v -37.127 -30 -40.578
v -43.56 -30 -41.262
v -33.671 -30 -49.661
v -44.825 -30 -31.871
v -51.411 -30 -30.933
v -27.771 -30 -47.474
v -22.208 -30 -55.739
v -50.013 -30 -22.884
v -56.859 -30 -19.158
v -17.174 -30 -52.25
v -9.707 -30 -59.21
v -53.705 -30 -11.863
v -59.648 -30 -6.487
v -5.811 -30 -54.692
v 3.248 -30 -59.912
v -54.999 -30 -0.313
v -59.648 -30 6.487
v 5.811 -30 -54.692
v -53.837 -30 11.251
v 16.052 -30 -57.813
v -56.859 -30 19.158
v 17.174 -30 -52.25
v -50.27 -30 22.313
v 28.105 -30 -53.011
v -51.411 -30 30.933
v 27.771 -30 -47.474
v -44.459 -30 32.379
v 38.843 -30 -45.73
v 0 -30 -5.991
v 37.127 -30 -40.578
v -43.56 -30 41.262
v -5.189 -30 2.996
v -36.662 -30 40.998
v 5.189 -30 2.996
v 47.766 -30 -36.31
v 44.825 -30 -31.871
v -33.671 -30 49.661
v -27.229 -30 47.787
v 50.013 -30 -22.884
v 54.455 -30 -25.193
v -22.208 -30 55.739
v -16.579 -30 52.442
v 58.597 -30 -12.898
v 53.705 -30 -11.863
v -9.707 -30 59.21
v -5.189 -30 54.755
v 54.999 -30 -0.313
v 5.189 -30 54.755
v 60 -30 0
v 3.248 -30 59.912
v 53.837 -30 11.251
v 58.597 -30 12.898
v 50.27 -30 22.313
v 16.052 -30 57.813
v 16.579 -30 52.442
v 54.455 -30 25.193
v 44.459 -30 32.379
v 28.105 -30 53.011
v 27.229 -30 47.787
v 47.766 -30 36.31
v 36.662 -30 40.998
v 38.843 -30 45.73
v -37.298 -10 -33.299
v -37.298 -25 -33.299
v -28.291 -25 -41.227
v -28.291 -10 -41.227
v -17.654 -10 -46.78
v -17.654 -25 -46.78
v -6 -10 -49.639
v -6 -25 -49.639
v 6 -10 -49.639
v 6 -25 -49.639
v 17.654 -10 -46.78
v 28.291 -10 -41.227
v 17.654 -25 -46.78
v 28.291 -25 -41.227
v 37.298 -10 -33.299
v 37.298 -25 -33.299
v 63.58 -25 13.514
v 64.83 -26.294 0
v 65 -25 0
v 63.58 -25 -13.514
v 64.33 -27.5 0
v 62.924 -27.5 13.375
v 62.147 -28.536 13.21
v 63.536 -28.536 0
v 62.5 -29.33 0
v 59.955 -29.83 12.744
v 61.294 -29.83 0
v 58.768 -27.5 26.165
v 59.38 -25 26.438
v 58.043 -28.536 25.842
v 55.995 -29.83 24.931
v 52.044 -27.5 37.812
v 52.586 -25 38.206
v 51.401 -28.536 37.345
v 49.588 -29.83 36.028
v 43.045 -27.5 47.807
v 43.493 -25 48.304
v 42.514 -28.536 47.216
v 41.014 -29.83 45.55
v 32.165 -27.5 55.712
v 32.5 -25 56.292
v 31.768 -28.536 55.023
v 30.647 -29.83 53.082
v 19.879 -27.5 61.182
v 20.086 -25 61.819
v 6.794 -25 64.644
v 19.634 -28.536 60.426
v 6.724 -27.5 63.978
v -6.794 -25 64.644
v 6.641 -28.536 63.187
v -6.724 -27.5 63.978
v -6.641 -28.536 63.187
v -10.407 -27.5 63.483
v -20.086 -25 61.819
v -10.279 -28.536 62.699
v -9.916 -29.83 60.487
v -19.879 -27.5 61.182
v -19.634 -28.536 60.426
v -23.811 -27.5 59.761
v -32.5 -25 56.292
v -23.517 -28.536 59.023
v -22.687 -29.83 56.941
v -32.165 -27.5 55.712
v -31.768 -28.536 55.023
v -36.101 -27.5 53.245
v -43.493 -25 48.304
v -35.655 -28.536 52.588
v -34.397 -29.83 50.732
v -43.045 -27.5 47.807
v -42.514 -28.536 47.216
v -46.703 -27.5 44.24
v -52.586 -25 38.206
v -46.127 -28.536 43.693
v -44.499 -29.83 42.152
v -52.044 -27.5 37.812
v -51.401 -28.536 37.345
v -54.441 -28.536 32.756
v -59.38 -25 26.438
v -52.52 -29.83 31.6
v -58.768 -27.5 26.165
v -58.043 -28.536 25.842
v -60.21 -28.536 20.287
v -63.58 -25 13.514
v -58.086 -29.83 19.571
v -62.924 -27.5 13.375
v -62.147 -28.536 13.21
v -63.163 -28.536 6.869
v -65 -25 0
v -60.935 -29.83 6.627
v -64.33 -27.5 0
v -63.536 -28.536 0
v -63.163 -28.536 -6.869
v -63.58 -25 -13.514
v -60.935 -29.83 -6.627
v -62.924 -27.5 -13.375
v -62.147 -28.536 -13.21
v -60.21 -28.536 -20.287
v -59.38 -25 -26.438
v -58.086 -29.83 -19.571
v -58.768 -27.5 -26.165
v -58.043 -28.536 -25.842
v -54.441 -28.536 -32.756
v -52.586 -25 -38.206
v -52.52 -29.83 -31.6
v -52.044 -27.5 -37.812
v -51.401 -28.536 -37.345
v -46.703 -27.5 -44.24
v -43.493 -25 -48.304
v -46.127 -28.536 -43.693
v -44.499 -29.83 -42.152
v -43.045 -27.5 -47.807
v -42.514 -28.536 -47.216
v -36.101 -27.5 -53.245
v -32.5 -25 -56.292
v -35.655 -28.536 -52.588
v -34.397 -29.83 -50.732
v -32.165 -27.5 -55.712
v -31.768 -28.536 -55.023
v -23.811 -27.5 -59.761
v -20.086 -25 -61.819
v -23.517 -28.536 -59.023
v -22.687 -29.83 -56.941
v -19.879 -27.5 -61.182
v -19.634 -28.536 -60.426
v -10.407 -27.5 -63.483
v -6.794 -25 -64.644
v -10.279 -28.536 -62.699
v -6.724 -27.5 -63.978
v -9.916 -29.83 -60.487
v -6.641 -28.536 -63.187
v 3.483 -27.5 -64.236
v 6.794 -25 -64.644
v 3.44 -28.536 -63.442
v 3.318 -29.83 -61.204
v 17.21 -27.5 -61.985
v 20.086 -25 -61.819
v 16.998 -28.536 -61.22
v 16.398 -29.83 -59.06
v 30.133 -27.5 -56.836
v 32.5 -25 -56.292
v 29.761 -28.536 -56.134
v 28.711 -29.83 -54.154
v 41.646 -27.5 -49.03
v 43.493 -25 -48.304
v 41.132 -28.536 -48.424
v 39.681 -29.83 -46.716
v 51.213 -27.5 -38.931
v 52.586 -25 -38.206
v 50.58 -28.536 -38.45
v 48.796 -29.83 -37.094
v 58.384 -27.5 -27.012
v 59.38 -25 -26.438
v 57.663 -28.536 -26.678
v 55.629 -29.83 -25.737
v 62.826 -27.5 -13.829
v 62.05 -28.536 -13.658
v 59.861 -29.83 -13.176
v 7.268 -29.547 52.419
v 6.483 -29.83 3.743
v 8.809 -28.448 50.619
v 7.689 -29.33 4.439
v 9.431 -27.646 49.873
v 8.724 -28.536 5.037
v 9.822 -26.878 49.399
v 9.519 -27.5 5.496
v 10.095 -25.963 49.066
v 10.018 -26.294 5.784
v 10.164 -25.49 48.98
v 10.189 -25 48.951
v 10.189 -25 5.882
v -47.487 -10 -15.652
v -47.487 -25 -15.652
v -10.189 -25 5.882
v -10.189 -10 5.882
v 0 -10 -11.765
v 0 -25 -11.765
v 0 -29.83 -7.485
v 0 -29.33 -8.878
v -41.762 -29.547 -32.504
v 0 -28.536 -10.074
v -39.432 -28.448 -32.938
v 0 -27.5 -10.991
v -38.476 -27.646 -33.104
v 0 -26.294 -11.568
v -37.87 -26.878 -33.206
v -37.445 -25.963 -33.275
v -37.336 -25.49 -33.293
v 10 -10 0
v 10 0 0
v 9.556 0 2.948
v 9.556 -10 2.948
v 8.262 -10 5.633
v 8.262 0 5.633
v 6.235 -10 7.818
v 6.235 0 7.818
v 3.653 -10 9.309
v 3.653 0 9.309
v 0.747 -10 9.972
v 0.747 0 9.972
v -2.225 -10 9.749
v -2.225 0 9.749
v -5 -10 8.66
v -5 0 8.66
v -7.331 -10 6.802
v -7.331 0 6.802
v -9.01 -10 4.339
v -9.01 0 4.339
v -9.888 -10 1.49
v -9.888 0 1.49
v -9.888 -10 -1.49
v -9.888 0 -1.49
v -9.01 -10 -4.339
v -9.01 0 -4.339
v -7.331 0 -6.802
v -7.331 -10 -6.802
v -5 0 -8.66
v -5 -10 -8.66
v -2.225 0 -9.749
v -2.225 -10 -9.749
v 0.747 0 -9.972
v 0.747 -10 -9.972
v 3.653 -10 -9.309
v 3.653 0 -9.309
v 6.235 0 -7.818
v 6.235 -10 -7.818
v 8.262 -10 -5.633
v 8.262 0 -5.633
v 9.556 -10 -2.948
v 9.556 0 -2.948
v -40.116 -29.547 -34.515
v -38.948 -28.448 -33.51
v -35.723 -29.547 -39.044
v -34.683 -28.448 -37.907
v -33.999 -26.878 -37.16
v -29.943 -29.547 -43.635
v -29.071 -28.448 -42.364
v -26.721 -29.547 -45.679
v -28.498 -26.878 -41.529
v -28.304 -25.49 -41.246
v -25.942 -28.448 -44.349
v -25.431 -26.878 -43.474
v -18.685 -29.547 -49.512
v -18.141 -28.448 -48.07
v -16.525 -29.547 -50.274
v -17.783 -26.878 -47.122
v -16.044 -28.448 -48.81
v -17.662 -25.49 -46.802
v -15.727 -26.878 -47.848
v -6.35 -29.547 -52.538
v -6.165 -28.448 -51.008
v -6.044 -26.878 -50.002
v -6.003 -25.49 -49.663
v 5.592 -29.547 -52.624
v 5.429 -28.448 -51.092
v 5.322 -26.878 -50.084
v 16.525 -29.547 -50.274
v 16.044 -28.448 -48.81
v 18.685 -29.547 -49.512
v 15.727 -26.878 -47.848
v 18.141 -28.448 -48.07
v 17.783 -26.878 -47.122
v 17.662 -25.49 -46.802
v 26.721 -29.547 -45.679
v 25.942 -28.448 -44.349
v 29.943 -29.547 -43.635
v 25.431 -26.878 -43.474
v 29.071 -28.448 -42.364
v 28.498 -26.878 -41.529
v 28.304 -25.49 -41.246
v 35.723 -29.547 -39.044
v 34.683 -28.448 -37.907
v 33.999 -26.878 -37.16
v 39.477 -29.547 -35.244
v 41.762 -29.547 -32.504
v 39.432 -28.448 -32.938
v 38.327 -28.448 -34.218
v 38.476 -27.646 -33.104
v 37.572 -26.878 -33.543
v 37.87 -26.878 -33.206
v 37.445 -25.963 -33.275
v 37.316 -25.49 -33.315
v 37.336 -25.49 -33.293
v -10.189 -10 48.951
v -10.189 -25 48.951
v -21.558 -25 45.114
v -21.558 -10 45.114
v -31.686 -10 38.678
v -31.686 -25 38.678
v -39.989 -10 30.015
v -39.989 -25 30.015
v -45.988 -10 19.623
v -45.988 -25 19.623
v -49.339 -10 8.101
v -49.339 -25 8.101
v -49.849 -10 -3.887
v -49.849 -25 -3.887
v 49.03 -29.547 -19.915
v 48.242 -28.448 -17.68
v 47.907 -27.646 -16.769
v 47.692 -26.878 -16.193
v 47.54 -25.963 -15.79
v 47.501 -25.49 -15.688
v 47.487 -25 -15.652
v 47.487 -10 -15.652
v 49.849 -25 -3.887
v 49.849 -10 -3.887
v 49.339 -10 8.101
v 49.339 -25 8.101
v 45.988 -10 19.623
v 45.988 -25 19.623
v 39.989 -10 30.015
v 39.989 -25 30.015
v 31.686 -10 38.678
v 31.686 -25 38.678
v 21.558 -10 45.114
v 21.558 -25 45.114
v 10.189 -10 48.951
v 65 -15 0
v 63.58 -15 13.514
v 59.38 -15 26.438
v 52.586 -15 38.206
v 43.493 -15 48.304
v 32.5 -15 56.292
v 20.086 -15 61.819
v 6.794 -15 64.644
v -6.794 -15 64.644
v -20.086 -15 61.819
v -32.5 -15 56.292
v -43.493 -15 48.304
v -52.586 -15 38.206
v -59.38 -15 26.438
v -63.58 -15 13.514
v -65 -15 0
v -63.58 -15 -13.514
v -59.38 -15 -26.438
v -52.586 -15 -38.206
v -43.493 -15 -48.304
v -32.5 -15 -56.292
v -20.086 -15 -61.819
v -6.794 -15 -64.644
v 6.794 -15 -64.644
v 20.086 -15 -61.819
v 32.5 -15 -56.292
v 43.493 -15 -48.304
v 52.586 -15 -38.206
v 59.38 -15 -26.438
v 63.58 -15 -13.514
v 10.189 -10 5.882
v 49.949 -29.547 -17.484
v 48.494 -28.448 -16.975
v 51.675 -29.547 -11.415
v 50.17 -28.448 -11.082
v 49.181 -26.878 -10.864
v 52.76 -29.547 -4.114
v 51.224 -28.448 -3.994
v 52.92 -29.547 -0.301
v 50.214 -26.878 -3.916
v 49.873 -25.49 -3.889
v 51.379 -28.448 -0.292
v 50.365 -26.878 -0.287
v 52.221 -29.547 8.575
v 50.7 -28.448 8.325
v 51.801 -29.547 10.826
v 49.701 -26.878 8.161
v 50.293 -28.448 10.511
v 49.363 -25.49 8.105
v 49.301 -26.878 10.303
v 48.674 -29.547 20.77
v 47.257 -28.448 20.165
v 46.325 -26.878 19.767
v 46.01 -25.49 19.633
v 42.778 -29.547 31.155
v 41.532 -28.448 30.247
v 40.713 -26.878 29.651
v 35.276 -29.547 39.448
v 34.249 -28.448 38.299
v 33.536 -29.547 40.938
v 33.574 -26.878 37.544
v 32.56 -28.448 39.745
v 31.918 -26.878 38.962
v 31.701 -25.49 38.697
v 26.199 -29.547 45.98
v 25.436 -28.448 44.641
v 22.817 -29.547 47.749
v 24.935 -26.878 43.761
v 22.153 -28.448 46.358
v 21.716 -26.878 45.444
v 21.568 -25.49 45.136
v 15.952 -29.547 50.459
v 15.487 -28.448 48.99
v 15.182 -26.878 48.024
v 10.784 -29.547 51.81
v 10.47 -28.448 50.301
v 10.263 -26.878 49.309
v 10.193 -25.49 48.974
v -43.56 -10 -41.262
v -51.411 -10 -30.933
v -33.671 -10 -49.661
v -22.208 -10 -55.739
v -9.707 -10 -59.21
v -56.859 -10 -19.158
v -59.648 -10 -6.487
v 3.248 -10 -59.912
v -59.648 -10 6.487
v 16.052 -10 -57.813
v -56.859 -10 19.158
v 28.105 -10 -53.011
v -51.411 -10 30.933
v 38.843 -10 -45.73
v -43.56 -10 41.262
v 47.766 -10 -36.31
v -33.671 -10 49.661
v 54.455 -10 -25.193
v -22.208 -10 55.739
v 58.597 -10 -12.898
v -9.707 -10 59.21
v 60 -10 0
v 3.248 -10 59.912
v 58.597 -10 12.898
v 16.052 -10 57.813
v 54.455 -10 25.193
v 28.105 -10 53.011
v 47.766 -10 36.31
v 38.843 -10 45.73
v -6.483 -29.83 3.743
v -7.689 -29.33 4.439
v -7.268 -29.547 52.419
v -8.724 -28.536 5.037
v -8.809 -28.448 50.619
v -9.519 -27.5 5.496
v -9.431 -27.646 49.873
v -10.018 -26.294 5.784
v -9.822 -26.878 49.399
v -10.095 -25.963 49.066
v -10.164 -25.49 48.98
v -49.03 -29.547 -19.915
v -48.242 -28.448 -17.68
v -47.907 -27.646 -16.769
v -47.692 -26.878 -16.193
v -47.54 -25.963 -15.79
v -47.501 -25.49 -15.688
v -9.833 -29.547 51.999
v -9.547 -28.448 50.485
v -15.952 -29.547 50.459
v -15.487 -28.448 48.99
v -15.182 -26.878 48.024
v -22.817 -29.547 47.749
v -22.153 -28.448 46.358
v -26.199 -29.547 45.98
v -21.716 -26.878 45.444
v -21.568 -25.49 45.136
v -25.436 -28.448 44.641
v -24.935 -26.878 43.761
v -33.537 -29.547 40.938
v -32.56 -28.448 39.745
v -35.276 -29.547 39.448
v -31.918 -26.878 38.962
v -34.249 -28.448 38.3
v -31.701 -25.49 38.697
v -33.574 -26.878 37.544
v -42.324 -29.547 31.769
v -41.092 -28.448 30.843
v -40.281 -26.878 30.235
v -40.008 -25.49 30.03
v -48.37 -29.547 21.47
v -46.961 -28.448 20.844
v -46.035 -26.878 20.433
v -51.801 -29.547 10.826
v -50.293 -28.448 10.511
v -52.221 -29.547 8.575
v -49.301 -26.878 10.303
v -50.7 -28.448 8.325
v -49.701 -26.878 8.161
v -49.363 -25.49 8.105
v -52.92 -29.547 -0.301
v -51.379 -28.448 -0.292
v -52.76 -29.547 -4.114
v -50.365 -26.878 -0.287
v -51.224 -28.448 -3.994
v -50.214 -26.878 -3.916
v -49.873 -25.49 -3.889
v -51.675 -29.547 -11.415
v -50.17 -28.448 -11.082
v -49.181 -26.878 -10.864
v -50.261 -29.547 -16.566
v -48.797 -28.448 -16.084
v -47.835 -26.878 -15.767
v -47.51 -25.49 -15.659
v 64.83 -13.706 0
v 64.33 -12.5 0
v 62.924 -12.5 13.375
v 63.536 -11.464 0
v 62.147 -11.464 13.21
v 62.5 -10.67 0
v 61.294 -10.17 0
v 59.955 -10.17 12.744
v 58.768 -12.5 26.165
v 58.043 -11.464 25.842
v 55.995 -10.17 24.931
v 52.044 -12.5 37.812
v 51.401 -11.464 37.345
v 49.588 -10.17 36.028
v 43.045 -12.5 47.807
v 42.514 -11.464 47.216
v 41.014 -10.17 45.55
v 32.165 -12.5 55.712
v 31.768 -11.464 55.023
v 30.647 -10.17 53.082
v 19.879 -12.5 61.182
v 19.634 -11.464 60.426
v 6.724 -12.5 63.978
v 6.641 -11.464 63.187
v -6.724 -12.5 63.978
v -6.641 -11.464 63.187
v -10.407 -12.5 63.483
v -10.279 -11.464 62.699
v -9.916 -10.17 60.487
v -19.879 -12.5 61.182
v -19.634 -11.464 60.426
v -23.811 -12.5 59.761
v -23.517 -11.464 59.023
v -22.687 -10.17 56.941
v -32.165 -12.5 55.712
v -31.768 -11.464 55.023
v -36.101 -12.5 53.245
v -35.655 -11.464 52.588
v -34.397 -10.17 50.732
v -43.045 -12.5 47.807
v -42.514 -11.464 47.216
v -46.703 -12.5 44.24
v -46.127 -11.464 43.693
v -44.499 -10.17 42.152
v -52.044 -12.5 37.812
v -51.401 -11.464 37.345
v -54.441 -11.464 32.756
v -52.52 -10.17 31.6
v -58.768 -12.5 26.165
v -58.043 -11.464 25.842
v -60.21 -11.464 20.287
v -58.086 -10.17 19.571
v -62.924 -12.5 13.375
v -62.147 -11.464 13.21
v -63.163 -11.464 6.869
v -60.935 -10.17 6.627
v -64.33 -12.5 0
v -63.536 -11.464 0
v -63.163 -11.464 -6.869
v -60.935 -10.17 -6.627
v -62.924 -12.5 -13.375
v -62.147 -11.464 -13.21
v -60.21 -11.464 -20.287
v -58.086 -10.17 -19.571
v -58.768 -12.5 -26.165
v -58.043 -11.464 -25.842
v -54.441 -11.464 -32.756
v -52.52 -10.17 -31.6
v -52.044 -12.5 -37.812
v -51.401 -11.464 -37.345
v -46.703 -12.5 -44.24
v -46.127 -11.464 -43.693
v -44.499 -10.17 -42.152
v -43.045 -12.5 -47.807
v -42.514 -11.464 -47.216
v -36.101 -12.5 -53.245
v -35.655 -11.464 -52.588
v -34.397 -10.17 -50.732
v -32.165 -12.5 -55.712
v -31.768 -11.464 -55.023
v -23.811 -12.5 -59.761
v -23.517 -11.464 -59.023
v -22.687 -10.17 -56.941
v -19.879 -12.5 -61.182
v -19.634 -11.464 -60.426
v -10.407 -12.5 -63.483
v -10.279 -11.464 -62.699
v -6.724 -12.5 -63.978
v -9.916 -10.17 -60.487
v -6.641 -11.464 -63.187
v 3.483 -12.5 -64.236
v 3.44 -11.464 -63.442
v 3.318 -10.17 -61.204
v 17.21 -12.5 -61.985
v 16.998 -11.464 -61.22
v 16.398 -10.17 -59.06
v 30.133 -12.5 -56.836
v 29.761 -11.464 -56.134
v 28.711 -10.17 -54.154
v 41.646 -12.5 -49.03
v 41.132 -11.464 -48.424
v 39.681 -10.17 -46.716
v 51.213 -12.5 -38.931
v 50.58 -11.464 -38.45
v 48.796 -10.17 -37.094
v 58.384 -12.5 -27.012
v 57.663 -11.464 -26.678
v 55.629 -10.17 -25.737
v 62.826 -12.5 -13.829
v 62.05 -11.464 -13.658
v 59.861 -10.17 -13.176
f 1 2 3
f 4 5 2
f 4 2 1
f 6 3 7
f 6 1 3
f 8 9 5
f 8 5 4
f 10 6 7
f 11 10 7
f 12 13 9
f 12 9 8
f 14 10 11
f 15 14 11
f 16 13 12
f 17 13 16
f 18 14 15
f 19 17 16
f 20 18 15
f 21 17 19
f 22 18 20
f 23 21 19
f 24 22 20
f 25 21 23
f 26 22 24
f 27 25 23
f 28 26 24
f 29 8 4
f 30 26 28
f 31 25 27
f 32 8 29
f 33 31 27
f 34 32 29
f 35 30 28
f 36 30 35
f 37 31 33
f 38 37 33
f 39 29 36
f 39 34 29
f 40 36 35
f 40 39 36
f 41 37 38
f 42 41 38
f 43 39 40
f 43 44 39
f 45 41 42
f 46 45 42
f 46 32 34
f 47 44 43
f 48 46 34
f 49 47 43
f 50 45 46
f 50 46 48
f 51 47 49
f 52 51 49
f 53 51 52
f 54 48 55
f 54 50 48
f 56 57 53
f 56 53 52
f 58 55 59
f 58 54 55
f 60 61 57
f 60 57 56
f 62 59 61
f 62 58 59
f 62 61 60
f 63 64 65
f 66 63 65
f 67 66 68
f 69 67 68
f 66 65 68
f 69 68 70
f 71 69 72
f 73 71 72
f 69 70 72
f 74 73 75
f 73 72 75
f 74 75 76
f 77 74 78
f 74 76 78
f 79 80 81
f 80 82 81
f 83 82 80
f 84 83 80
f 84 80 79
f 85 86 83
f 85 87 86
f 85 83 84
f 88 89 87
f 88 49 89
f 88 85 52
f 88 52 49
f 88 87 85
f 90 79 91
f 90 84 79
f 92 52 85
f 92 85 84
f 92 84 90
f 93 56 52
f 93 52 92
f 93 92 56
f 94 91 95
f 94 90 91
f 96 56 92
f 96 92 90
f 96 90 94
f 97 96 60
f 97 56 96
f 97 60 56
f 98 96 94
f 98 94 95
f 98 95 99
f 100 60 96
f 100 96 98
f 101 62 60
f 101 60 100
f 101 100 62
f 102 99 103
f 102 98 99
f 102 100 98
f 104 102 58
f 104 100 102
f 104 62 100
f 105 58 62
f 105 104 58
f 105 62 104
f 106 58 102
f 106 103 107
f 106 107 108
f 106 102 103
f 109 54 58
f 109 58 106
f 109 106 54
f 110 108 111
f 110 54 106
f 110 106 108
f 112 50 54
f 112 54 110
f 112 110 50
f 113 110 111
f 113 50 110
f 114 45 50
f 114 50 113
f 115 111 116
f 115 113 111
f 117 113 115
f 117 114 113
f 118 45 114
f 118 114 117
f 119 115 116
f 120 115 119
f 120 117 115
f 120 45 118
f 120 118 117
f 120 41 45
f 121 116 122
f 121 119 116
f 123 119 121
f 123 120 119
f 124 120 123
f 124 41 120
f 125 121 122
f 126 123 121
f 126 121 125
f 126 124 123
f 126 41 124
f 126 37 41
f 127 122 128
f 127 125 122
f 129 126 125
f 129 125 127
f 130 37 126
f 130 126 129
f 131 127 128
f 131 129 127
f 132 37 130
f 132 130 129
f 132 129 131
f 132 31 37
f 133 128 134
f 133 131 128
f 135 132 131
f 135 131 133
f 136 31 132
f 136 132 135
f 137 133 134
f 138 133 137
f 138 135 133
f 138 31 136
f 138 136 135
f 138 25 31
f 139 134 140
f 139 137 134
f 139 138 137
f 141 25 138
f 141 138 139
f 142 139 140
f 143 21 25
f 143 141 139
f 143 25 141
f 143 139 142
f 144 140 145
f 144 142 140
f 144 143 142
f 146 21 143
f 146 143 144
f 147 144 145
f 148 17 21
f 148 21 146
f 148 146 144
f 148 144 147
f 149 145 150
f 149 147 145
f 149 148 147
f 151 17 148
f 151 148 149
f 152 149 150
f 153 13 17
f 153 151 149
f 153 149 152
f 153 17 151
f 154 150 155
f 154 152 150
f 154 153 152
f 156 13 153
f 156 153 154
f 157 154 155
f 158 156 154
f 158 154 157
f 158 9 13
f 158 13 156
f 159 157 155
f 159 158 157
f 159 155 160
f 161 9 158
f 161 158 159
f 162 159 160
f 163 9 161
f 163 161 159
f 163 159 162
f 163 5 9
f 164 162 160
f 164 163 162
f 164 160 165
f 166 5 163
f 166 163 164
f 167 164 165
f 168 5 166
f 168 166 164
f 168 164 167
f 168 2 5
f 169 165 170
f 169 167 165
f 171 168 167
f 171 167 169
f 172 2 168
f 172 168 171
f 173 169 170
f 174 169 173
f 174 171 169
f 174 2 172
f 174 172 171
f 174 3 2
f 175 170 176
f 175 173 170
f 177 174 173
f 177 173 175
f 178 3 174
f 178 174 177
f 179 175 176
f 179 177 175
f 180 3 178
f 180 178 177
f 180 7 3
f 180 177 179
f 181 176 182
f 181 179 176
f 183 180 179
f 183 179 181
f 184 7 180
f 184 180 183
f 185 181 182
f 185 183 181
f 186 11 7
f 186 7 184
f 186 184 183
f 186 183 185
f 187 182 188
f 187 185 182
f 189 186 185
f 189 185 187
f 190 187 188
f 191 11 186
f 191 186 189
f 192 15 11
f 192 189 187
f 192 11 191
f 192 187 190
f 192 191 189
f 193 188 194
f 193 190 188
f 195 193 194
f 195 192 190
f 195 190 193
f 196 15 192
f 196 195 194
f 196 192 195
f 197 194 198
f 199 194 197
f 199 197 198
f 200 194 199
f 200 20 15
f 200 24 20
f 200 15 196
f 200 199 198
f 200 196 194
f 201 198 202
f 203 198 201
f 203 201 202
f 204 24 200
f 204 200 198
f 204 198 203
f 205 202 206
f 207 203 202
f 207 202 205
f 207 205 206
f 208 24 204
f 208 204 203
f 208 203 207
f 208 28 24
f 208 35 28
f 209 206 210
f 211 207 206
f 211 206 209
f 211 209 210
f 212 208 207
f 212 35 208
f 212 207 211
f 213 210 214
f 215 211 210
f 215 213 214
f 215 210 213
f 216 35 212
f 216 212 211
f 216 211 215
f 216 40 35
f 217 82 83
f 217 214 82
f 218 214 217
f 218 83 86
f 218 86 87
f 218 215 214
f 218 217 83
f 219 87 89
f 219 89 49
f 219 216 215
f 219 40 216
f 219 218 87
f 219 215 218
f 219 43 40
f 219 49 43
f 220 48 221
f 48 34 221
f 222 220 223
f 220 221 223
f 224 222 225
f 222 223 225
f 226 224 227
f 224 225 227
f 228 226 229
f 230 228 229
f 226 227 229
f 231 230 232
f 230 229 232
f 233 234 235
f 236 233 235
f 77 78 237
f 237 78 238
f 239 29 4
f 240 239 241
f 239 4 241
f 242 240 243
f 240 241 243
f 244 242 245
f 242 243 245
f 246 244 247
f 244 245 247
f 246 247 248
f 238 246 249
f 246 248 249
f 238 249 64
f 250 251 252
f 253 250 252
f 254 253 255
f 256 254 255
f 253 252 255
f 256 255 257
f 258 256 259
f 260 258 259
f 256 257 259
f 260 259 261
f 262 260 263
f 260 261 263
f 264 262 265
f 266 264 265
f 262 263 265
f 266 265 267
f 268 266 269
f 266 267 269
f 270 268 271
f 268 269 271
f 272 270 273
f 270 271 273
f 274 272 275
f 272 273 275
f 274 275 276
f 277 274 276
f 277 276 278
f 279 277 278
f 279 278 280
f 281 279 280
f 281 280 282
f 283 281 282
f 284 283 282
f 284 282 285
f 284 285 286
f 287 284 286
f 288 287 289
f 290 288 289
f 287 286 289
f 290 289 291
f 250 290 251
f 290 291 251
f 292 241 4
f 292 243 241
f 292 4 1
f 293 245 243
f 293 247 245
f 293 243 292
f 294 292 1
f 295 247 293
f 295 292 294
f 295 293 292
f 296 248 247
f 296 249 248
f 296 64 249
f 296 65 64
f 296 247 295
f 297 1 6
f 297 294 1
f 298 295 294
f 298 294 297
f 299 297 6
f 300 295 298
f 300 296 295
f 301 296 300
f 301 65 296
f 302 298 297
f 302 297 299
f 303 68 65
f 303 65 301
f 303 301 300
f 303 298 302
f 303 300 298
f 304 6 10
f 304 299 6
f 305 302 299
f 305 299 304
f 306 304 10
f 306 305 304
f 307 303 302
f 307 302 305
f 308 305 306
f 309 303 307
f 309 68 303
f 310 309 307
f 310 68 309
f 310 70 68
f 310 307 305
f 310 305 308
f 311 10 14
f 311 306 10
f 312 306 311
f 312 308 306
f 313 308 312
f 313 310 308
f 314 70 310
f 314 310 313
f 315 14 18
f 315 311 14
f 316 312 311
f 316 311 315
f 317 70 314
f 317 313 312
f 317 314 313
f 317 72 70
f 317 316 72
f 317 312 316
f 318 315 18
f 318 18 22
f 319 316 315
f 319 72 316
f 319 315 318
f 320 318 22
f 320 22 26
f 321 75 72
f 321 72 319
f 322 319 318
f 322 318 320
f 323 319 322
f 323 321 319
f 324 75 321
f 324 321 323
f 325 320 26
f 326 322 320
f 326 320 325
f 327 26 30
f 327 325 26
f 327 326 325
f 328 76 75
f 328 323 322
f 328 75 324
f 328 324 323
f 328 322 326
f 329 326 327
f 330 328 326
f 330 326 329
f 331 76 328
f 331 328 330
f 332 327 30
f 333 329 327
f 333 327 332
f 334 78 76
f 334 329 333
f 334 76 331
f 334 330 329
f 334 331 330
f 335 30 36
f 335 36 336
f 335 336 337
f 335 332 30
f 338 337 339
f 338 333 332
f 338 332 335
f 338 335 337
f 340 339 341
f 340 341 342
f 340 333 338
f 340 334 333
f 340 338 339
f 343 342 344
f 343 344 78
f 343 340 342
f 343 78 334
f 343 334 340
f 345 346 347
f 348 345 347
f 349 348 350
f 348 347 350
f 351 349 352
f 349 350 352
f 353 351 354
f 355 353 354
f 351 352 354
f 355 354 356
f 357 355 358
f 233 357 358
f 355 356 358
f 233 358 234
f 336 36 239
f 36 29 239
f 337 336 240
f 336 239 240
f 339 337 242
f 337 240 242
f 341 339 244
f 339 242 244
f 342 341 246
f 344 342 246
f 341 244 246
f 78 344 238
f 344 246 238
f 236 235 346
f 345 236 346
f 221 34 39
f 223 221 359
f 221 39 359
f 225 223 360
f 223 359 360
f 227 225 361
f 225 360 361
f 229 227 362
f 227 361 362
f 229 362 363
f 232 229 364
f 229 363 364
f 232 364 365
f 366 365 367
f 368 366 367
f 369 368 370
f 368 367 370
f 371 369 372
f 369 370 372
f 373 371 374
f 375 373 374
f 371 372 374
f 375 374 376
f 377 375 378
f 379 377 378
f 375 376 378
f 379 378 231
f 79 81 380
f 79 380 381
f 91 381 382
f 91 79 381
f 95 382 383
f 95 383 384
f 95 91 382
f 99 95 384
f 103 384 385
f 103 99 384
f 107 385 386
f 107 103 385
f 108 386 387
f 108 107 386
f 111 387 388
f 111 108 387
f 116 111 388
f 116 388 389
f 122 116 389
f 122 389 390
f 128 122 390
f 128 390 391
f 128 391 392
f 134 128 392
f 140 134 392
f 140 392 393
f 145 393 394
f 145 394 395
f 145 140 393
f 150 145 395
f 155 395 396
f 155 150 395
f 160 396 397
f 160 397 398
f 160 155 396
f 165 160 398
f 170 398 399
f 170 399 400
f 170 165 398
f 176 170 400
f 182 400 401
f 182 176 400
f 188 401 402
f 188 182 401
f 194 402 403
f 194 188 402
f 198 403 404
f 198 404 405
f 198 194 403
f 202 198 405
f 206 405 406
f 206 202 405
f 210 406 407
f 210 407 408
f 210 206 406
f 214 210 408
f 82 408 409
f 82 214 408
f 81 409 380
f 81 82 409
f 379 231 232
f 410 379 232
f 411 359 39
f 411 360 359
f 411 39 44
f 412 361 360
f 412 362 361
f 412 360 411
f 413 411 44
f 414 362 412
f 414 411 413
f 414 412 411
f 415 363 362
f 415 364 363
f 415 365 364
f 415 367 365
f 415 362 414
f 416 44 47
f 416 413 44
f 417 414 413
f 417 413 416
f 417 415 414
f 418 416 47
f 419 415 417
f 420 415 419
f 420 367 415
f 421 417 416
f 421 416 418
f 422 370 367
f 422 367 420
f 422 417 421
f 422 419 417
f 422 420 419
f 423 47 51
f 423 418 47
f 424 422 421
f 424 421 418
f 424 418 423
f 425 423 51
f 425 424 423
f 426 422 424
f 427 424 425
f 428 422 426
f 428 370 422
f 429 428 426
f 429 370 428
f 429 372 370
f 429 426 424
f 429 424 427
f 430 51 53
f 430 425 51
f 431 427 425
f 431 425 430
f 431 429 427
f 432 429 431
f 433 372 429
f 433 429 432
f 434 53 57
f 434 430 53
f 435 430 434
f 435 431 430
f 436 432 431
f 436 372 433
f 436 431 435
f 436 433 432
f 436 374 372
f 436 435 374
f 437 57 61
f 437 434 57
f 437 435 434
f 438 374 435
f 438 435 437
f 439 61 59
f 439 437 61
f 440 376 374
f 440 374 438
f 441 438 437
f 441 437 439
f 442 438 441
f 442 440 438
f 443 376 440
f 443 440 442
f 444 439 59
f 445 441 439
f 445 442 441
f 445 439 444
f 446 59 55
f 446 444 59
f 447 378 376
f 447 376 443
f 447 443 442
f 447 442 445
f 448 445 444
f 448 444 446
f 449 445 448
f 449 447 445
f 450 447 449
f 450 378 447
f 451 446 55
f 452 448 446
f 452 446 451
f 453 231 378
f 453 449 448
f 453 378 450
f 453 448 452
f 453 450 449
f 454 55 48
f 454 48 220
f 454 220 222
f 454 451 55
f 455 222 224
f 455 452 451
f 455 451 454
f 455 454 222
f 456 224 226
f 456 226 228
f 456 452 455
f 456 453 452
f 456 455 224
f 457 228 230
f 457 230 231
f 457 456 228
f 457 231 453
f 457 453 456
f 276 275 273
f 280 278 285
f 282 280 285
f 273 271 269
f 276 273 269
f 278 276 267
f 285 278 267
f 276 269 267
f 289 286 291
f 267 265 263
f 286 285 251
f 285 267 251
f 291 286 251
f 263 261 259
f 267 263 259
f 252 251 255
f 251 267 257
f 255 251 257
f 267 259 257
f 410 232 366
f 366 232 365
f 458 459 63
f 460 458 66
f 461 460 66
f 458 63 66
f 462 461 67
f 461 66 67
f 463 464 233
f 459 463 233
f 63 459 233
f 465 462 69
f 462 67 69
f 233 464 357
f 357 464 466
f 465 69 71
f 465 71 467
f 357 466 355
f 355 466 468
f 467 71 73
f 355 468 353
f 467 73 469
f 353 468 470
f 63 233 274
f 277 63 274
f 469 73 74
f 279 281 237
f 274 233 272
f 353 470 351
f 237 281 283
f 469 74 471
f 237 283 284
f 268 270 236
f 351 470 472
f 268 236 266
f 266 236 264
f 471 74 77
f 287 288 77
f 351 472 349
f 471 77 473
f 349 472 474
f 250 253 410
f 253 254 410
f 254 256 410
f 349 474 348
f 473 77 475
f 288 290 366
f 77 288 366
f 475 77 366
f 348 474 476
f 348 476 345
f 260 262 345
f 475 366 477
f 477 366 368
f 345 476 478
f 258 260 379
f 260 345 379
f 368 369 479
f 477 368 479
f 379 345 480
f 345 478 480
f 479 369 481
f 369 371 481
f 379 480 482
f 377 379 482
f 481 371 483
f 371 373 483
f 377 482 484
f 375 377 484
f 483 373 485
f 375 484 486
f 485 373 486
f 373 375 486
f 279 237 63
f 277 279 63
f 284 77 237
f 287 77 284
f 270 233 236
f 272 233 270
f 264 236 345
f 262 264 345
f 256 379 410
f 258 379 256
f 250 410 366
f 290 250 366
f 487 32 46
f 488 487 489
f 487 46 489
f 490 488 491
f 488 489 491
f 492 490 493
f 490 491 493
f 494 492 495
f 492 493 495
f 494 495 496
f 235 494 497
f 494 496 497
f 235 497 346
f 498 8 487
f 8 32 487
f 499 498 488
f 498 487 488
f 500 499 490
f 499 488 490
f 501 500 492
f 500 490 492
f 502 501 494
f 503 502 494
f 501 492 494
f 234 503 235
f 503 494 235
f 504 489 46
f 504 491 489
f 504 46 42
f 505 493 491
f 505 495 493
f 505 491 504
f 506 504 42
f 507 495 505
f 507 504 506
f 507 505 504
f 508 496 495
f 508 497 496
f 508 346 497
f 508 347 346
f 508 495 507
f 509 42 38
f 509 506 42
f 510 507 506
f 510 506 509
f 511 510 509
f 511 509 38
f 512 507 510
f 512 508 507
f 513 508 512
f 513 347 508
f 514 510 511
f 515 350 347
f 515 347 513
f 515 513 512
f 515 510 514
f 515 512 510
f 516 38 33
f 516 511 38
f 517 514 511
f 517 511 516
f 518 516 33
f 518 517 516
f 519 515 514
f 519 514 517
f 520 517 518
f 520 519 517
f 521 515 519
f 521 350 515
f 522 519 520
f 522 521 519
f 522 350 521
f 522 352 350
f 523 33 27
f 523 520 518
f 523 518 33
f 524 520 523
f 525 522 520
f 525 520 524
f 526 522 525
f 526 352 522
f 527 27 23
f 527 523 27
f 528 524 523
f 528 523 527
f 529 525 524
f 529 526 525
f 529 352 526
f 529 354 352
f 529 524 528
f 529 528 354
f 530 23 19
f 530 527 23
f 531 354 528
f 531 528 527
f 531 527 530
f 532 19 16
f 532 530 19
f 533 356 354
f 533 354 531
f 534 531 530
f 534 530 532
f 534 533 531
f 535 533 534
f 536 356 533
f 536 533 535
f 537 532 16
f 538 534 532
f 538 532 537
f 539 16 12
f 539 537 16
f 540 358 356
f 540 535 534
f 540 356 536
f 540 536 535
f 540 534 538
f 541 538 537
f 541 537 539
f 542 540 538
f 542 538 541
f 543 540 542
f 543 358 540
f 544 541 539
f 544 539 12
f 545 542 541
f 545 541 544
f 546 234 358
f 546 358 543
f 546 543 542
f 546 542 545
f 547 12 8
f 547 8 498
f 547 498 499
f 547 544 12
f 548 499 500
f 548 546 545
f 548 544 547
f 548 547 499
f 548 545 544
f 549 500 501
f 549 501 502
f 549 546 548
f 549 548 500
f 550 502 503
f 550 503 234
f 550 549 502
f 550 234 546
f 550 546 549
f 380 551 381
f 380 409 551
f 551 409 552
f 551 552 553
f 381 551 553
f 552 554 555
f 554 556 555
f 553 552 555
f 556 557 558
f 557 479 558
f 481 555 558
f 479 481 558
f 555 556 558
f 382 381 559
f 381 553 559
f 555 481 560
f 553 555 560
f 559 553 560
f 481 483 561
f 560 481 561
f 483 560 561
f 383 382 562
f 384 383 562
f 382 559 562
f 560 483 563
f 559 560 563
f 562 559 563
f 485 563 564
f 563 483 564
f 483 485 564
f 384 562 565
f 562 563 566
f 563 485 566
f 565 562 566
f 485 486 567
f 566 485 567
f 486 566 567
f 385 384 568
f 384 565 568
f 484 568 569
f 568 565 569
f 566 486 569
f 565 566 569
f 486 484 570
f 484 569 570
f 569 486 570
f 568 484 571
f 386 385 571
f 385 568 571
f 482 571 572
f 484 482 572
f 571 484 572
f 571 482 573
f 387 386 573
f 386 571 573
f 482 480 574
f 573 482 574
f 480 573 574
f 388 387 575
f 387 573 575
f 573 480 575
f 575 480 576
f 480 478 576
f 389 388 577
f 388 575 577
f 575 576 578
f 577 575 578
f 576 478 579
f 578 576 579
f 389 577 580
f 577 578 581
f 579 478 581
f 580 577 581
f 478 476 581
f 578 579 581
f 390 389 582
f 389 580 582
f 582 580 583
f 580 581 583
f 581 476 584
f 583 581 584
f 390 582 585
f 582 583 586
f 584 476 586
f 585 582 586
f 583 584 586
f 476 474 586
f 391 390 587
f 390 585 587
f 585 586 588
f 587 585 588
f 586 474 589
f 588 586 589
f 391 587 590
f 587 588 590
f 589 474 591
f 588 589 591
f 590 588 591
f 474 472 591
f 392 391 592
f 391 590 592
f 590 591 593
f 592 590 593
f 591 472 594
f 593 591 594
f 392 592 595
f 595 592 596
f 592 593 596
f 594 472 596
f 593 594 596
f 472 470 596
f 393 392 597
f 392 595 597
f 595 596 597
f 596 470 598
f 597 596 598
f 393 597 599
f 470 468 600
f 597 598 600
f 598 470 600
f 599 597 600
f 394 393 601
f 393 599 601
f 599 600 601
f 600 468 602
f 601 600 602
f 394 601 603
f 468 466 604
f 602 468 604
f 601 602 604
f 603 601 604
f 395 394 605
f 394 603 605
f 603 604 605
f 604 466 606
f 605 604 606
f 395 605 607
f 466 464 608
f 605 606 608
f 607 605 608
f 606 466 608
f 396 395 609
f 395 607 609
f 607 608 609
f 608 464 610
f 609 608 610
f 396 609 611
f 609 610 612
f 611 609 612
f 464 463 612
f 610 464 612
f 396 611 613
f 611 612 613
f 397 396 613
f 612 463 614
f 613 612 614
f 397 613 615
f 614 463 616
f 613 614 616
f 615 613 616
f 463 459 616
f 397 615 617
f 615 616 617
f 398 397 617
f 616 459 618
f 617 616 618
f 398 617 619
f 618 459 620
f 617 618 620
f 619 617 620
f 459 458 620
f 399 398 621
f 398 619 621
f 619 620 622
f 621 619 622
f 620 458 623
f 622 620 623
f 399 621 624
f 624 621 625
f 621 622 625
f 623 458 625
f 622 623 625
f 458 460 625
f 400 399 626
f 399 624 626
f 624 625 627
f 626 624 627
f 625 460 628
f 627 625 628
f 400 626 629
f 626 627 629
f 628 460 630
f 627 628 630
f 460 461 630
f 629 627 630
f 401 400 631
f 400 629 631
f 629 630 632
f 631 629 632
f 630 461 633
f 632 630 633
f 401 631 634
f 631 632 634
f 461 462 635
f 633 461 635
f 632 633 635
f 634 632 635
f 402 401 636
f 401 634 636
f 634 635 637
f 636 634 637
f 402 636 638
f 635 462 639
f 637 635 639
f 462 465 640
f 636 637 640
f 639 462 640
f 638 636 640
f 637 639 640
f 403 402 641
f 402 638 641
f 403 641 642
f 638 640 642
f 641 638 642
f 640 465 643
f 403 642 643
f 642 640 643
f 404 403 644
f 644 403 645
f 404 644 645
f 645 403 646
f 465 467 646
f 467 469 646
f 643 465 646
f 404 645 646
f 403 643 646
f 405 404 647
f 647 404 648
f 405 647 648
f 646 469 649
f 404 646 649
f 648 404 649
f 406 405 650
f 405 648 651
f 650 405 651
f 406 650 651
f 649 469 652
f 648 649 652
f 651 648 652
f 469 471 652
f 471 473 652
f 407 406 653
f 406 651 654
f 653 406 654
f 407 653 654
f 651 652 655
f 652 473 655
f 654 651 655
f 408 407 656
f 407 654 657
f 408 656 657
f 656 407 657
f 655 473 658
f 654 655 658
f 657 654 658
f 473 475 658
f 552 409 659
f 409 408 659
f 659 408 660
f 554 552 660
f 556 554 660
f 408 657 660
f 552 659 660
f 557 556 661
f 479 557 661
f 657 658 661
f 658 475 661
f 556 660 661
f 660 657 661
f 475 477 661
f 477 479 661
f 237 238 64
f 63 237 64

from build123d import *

# Parameters (mm, degrees)
F0_R     = 10
F1_DEPTH = 10
F3_R     = 65
F4_DEPTH = 20
F6_DEPTH = 20
F7_R     = 5


with BuildPart() as f1:
    # F0 (on Front) → F1 (new body)
    with BuildSketch(Plane.XZ):
        Circle(F0_R)
    extrude(amount=F1_DEPTH)

    # F3 (on offset) → F4 (join, through all)
    with BuildSketch(Plane.XZ.offset(30)):
        Circle(F3_R)
    extrude(amount=-F4_DEPTH)

    # F5 (on face) → F6 (cut, through all)
    with BuildSketch(Plane.XZ.offset(30)):
        with BuildLine():
            Line((-47.487018, -15.651937), (-10.188534, 5.882353))
            Line((-10.188534, 5.882353), (-10.188534, 48.950932))
            ThreePointArc((-10.188534, 48.950932), (-43.30127, 25), (-47.487018, -15.651937))
        make_face()
        with BuildLine():
            Line((10.188534, 48.950932), (10.188534, 5.882353))
            Line((10.188534, 5.882353), (47.487018, -15.651937))
            ThreePointArc((47.487018, -15.651937), (43.30127, 25), (10.188534, 48.950932))
        make_face()
        with BuildLine():
            Line((0, -11.764706), (-37.298484, -33.298996))
            ThreePointArc((-37.298484, -33.298996), (0, -50), (37.298484, -33.298996))
            Line((37.298484, -33.298996), (0, -11.764706))
        make_face()
    extrude(amount=-F6_DEPTH, mode=Mode.SUBTRACT)

    # F7
    f7_edges = [f1.edges().sort_by_distance(p)[0] for p in [
        (-65, -30, 0),
        (18.649242, -30, -22.531851),
        (-18.649242, -30, -22.531851),
        (0, -30, -50),
        (-28.837776, -30, -4.884792),
        (-10.188534, -30, 27.416643),
        (-43.30127, -30, 25),
        (10.188534, -30, 27.416643),
        (28.837776, -30, -4.884792),
        (43.30127, -30, 25),
        (65, -20, 0),
        (-65, -10, 0),
    ]]
    fillet(f7_edges, radius=F7_R)


solid = f1.part
